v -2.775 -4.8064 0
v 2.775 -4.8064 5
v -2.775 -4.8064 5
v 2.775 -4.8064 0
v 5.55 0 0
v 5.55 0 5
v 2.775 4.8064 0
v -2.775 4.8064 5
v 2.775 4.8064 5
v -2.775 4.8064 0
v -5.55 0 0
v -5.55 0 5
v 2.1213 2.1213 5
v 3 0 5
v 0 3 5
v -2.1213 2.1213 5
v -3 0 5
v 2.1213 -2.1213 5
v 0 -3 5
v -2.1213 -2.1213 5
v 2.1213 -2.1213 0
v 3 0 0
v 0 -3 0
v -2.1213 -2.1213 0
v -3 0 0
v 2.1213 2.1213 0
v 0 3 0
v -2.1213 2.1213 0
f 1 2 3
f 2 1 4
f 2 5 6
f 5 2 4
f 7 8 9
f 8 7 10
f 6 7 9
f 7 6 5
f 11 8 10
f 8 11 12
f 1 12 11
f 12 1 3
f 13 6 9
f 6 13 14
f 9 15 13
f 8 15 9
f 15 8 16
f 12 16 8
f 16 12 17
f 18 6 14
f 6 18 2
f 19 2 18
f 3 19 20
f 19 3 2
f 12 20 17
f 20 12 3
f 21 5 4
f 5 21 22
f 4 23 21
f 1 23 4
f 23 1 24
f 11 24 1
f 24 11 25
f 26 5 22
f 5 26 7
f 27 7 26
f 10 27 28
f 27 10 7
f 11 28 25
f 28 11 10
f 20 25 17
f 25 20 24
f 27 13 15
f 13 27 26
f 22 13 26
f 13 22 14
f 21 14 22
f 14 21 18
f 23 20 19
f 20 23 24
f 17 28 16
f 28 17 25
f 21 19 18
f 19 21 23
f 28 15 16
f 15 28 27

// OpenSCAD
// file: ../../lib/scad/nuts.scad
//Muts
include <../../settings/scad/global.scad>

fnl = fn; //fn local

//Mx = [rInt, rExt, height]
M3 = [1.5, 3, 2.2];
M4 = [2, 3.85, 3];
M5 = [2.5, 4.4, 4.5];
M6 = [3, 5.55, 5];
M8 = [4, 7.2, 6.44];
//M = [,,];


module nut_Mx(rInt=4,rExt=7.2,height=6.44){
		difference(){
			cylinder(height,rExt,rExt, $fn=6);
			translate([0,0,-1])
			cylinder(height+2,rInt,rInt, $fn=4*2*fnl);
		}
}

module nut_M3(){
	nut_Mx(M3[0], M3[1], M3[2]);
}
module nut_M4(){
	nut_Mx(M4[0], M4[1], M4[2]);
}
module nut_M5(){
	nut_Mx(M5[0], M5[1], M5[2]);
}
module nut_M6(){
	nut_Mx(M6[0], M6[1], M6[2]);
}
module nut_M8(){
	nut_Mx(M8[0], M8[1], M8[2]);
}

nut_M6();

module nut_M8_x(posX=0,posY=0,posZ=0){
	translate([posX,posY,posZ])
		rotate([0,90,0])
			color("grey")
				nut_M8();
}

module nut_M8_y(posX=0,posY=0,posZ=0){
	translate([posX,posY,posZ])
		rotate([-90,0,0])
			color("lightgrey")
				nut_M8();
}
module nut_M8_z(posX=0,posY=0,posZ=0){
	translate([posX,posY,posZ])
		rotate([0,0,90])
			color("darkgrey")
				nut_M8();
}
// file: ../../lib/scad/threadedBars.scad
//Threaded Bars
include <../../settings/scad/global.scad>

fnl = fn; //fn local

module threadedBar_M8_x(posX=0,posY=0,posZ=0, length=400){
	translate([posX,posY,posZ])
		rotate([0,90,0])
			color("grey")
				cylinder(length,4,4, $fn=8*fnl);
}

module threadedBar_M8_y(posX=0,posY=0,posZ=0, length=400){
	translate([posX,posY,posZ])
		rotate([-90,0,0])
			color("lightgrey")
				cylinder(length,4,4, $fn=8*fnl);
}
module threadedBar_M8_z(posX=0,posY=0,posZ=0, length=400){
	translate([posX,posY,posZ])
		rotate([0,0,90])
			color("darkgrey")
				cylinder(length,4,4, $fn=8*fnl);
}
// file: basement.scad
include <../../settings/scad/global.scad>

include <../../prn_200x200x200/scad/connector_m8.scad>
include <../../lib/scad/threadedBars.scad>
include <../../lib/scad/nuts.scad>


module threadedBarX(){
	threadedBar_M8_x(posX=-lnConnect-lnNuts, length=lnBase+2*(lnConnect+lnNuts));
	nut_M8_x(posX=-lnConnect-lnNuts+lnNutsShift);
	nut_M8_x(posX=0+lnNutsShift);
	nut_M8_x(posX=lnBase-lnNuts+lnNutsShift);
	nut_M8_x(posX=lnBase+lnConnect+lnNutsShift);
}

module threadedBarY(){
	threadedBar_M8_y(posY=-lnConnect-lnNuts, length=lnBase+2*(lnConnect+lnNuts));
	nut_M8_y(posY=-lnConnect-lnNuts+lnNutsShift);
	nut_M8_y(posY=0+lnNutsShift);
	nut_M8_y(posY=lnBase-lnNuts+lnNutsShift);
	nut_M8_y(posY=lnBase+lnConnect+lnNutsShift);
}

module basement() {
//front X
translate([0,-lnConnect+lnNuts-lnNutsShift,0]){
	connector_M8(posX=-lnConnect, clr="grey");
	connector_M8(posX=lnBase, clr="grey");
	translate([0,0,0]);
		threadedBarX();
	translate([0,lnConnect-Mx*2,0])
		threadedBarX();
	translate([0,(lnConnect-Mx*2)/2,(Mx-1)*4])
		threadedBarX();
}//translate

//back X
translate([0,lnNuts-lnNutsShift,0]){
	connector_M8(posX=-lnConnect, posY=lnBase, clr="grey");
	connector_M8(posX=lnBase, posY=lnBase, clr="grey");
	translate([0,lnBase,0])
		threadedBarX();
	translate([0,lnBase+lnConnect-Mx*2,0])
		threadedBarX();
	translate([0,lnBase+(lnConnect-Mx*2)/2,(Mx-1)*4])
		threadedBarX();
}//translate

// Y bars left
translate([-Mx,0, Mx*2-2])
	threadedBarY();	
translate([-lnConnect+Mx,0, Mx*2-2])
	threadedBarY();	
translate([(-lnConnect)/2,0, Mx*2-2+(Mx-1)*4])
	threadedBarY();	

// Y bars right
translate([lnBase+lnConnect-Mx,0, Mx*2-2])
	threadedBarY();	
translate([lnBase+Mx,0, Mx*2-2])
	threadedBarY();	
translate([lnBase+(lnConnect)/2,0, Mx*2-2+(Mx-1)*4])
	threadedBarY();
}//end of basement
// file: connector_m8.scad
include <../../settings/scad/global.scad>

include <../../lib/scad/threadedBars.scad>
include <../../lib/scad/nuts.scad>

fnl = 4*fn; //fn local
correction=1;
MX = 8;

M = MX-correction; //use M8 threaded bars
length=50;
lengthCorrected = length - 2*correction;
M_2 = M/2;
MX_2 = MX/2;

//threadedBar_M8_x(posXi=-10);
//nut_M8_x(posXi=-8);


module holderThrBar(posXi=0, posYi=0, posZi=0, rotXi=0, rotYi=0, rotZi=0, clri="red", Mx=8){
	translate([posXi, posYi, posZi])
		rotate([rotXi, rotYi, rotZi])
			color(clri)
				difference(){
					cylinder (length,Mx,Mx, $fn=Mx*fnl);
						translate([0,0,-1])
						cylinder (length+2,Mx/2+0.2,Mx/2+0.2, $fn=Mx/2*fnl);
				}//diff
} //holderThrBar

module holderThrBarX2(posXi=0, posYi=0, posZi=0, rotXi=0, rotYi=0, rotZi=0, clri="red", Mx=8){
	translate([posXi, posYi, posZi])
		rotate([rotXi, rotYi, rotZi])
			color(clri)
				difference(){
					cylinder (length*2,Mx,Mx, $fn=Mx*fnl);
						translate([0,0,-1])
						cylinder (length*2+2,Mx/2+0.2,Mx/2+0.2, $fn=Mx/2*fnl);
				}//diff
} //holderThrBar

module holderShaftBar(posXi=0, posYi=0, posZi=0, rotXi=0, rotYi=0, rotZi=0, clri="green", Mx=8){
	translate([posXi, posYi, posZi])
		rotate([rotXi, rotYi, rotZi])
			color(clri)
				difference(){
					cylinder (length,Mx,Mx, $fn=Mx*fnl);
						translate([0,0,length/2-1])
						cylinder (length/2+2,Mx/2+0.2,Mx/2+0.2, $fn=Mx/2*fnl);
				}//diff
} //holderShaftBar


module connector_M8(posX=0, posY=0, posZ=0, rotX=0, rotY=0, rotZ=0, clr="red"){
	translate([posX, posY, posZ])
		rotate([rotX, rotY, rotZ])
			color(clr){
				holderThrBar(rotYi=90, clri=clr);
				holderThrBar(posYi=length-M*2-correction*2, rotYi=90, clri=clr);
				holderThrBar(posYi=(length-M*2-correction*2)/2, posZi=M*4, rotYi=90, clri=clr);

				holderThrBar(posXi=length/2, posYi=-M-correction, posZi=M*6, rotYi=90, rotZi=90, clri=clr);
				holderThrBar(posXi=M+correction, posYi=-M-correction, posZi=M*2, rotYi=90, rotZi=90, clri=clr);
				holderThrBar(posXi=length-M-correction, posYi=-M-correction, posZi=M*2, rotYi=90, rotZi=90, clri=clr);
			}//transform
}//connector


module connector_M8_shaftY(posX=0, posY=0, posZ=0, rotX=0, rotY=0, rotZ=0, clr="green"){
	translate([posX, posY, posZ])
		rotate([rotX, rotY, rotZ])
			color(clr){
				holderThrBarX2(rotYi=90, clri=clr);
				holderThrBarX2(posYi=length-M*2-correction*2, rotYi=90, clri=clr);
				holderThrBarX2(posYi=(length-M*2-correction*2)/2, posZi=M*4, rotYi=90, clri=clr);

				
				holderShaftBar(posXi=M+correction, posYi=-M-correction, posZi=M*2, rotYi=90, rotZi=90, clri=clr);
				holderShaftBar(posXi=length*2-M-correction, posYi=-M-correction, posZi=M*2, rotYi=90, rotZi=90, clri=clr);
			}//transform
}//connector
//holderShaftBar();

//support
/*
translate([0,MX_2+0.2,-MX])
	cube([length,length-MX*3-0.2*2,MX*2]);

translate([M,-MX,M])
	cube([length-MX*3-0.2*2,length,MX*2]);
*/
/*
translate([0,-M,-M])
	difference(){
		minkowski(){
			cube([lengthCorrected,lengthCorrected,lengthCorrected]);
			sphere(M/2, $fn = 4*4*fnl);
		}//minkowski
		translate([0,0,-M_2])
			cube([lengthCorrected,lengthCorrected,lengthCorrected+M]);
		translate([0,-M_2,0])
			cube([lengthCorrected,lengthCorrected+M,lengthCorrected]);
		translate([-M_2,0,0])
			cube([lengthCorrected+M,lengthCorrected,lengthCorrected]);
}
*/
// file: ../../lib/scad/shafts.scad
fn_8mm = 20;
//shaft_8x350_x(posX, posY, posZ);
//shaft_8x350_y(posX, posY, posZ);
//shaft_8x350_z(posX, posY, posZ);

module shaft_8x350_x(posX=0,posY=0,posZ=0){
	translate([posX,posY,posZ])
		rotate([0,90,0])
			color("blue")
				cylinder(350,4,4, $fn=fn_8mm);
}

module shaft_8x350_y(posX=0,posY=0,posZ=0){
	translate([posX,posY,posZ])
		rotate([-90,0,0])
			color("lightblue")
				cylinder(350,4,4, $fn=fn_8mm);
}

module shaft_8x350_z(posX=0,posY=0,posZ=0){
	translate([posX,posY,posZ])
		rotate([0,0,90])
			color("darkblue")
				cylinder(350,4,4, $fn=fn_8mm);
}
// file: ../../settings/scad/global.scad
fn = 1;

shaftX_posZ = 100;

shaftY_posX = 100;

shaftZ_posY = 150;

lnBase = 300;			//lengthBase
lnConnect = 50;		//lengthConnect
lnNuts = 10;			//lengthNuts
lnNutsShift = 2;		//M8 Nut ~ 6 mm, so +2 mm from both side will give a lnNuts 10mm value 

Mx = 8;
correction=1;
M = Mx-correction; //use M8 threaded bars
M_2 = M/2;
Mx_2 = Mx/2;
// main file
include <../../settings/scad/global.scad>
include <../../lib/scad/shafts.scad>
include <../../prn_200x200x200/scad/connector_m8.scad>
include <../../prn_200x200x200/scad/basement.scad>

//basement();

shaftY_0=[shaftY_posX+Mx,-lnConnect/2,(Mx-correction)*2];
shaftY_1=[shaftY_posX+lnConnect*2-Mx,-lnConnect/2,(Mx-correction)*2];

shaftZ_left0=[-lnConnect+M+Mx_2, shaftZ_posY+Mx, lnConnect/2+Mx_2+correction];
shaftZ_left1=[-lnConnect+M+Mx_2, shaftZ_posY+lnConnect*2-Mx, lnConnect/2+Mx_2+correction];
shaftZ_right0=[lnBase+lnConnect-M-Mx_2, shaftZ_posY+Mx, lnConnect/2+Mx_2+correction];
shaftZ_right1=[lnBase+lnConnect-M-Mx_2, shaftZ_posY+lnConnect*2-Mx, lnConnect/2+Mx_2+correction];


module chassis_axisZ() {
	connector_M8_shaftZ(posX=lnBase+lnConnect-Mx, posY=shaftZ_posY, posZ=Mx+M, rotZ=90);
	connector_M8_shaftZ(posX=-lnConnect+Mx, posY=shaftZ_posY+lnConnect*2, posZ=Mx+M, rotZ=-90);

	shaft_8x350_z(shaftZ_left0[0],shaftZ_left0[1],shaftZ_left0[2]);
	LLMK8UU_zp(shaftZ_left0[0],shaftZ_left0[1],shaftZ_left0[2]+75);
	LLMK8UU_zn(shaftZ_left0[0],shaftZ_left0[1],shaftZ_left0[2]+175);

	shaft_8x350_z(shaftZ_left1[0],shaftZ_left1[1],shaftZ_left1[2]);
	LLMK8UU_zp(shaftZ_left1[0],shaftZ_left1[1],shaftZ_left1[2]+75);
	LLMK8UU_zn(shaftZ_left1[0],shaftZ_left1[1],shaftZ_left1[2]+175);

	// --- Z right shafts
	shaft_8x350_z(shaftZ_right0[0],shaftZ_right0[1],shaftZ_right0[2]);
	LLMK8UU_zp(shaftZ_right0[0],shaftZ_right0[1],shaftZ_right0[2]+75);
	LLMK8UU_zn(shaftZ_right0[0],shaftZ_right0[1],shaftZ_right0[2]+175);

	shaft_8x350_z(shaftZ_right1[0],shaftZ_right1[1],shaftZ_right1[2]);
	LLMK8UU_zp(shaftZ_right1[0],shaftZ_right1[1],shaftZ_right1[2]+75);
	LLMK8UU_zn(shaftZ_right1[0],shaftZ_right1[1],shaftZ_right1[2]+175);
}//axisY
//chassis_axisZ();
// --- Z left shafts
